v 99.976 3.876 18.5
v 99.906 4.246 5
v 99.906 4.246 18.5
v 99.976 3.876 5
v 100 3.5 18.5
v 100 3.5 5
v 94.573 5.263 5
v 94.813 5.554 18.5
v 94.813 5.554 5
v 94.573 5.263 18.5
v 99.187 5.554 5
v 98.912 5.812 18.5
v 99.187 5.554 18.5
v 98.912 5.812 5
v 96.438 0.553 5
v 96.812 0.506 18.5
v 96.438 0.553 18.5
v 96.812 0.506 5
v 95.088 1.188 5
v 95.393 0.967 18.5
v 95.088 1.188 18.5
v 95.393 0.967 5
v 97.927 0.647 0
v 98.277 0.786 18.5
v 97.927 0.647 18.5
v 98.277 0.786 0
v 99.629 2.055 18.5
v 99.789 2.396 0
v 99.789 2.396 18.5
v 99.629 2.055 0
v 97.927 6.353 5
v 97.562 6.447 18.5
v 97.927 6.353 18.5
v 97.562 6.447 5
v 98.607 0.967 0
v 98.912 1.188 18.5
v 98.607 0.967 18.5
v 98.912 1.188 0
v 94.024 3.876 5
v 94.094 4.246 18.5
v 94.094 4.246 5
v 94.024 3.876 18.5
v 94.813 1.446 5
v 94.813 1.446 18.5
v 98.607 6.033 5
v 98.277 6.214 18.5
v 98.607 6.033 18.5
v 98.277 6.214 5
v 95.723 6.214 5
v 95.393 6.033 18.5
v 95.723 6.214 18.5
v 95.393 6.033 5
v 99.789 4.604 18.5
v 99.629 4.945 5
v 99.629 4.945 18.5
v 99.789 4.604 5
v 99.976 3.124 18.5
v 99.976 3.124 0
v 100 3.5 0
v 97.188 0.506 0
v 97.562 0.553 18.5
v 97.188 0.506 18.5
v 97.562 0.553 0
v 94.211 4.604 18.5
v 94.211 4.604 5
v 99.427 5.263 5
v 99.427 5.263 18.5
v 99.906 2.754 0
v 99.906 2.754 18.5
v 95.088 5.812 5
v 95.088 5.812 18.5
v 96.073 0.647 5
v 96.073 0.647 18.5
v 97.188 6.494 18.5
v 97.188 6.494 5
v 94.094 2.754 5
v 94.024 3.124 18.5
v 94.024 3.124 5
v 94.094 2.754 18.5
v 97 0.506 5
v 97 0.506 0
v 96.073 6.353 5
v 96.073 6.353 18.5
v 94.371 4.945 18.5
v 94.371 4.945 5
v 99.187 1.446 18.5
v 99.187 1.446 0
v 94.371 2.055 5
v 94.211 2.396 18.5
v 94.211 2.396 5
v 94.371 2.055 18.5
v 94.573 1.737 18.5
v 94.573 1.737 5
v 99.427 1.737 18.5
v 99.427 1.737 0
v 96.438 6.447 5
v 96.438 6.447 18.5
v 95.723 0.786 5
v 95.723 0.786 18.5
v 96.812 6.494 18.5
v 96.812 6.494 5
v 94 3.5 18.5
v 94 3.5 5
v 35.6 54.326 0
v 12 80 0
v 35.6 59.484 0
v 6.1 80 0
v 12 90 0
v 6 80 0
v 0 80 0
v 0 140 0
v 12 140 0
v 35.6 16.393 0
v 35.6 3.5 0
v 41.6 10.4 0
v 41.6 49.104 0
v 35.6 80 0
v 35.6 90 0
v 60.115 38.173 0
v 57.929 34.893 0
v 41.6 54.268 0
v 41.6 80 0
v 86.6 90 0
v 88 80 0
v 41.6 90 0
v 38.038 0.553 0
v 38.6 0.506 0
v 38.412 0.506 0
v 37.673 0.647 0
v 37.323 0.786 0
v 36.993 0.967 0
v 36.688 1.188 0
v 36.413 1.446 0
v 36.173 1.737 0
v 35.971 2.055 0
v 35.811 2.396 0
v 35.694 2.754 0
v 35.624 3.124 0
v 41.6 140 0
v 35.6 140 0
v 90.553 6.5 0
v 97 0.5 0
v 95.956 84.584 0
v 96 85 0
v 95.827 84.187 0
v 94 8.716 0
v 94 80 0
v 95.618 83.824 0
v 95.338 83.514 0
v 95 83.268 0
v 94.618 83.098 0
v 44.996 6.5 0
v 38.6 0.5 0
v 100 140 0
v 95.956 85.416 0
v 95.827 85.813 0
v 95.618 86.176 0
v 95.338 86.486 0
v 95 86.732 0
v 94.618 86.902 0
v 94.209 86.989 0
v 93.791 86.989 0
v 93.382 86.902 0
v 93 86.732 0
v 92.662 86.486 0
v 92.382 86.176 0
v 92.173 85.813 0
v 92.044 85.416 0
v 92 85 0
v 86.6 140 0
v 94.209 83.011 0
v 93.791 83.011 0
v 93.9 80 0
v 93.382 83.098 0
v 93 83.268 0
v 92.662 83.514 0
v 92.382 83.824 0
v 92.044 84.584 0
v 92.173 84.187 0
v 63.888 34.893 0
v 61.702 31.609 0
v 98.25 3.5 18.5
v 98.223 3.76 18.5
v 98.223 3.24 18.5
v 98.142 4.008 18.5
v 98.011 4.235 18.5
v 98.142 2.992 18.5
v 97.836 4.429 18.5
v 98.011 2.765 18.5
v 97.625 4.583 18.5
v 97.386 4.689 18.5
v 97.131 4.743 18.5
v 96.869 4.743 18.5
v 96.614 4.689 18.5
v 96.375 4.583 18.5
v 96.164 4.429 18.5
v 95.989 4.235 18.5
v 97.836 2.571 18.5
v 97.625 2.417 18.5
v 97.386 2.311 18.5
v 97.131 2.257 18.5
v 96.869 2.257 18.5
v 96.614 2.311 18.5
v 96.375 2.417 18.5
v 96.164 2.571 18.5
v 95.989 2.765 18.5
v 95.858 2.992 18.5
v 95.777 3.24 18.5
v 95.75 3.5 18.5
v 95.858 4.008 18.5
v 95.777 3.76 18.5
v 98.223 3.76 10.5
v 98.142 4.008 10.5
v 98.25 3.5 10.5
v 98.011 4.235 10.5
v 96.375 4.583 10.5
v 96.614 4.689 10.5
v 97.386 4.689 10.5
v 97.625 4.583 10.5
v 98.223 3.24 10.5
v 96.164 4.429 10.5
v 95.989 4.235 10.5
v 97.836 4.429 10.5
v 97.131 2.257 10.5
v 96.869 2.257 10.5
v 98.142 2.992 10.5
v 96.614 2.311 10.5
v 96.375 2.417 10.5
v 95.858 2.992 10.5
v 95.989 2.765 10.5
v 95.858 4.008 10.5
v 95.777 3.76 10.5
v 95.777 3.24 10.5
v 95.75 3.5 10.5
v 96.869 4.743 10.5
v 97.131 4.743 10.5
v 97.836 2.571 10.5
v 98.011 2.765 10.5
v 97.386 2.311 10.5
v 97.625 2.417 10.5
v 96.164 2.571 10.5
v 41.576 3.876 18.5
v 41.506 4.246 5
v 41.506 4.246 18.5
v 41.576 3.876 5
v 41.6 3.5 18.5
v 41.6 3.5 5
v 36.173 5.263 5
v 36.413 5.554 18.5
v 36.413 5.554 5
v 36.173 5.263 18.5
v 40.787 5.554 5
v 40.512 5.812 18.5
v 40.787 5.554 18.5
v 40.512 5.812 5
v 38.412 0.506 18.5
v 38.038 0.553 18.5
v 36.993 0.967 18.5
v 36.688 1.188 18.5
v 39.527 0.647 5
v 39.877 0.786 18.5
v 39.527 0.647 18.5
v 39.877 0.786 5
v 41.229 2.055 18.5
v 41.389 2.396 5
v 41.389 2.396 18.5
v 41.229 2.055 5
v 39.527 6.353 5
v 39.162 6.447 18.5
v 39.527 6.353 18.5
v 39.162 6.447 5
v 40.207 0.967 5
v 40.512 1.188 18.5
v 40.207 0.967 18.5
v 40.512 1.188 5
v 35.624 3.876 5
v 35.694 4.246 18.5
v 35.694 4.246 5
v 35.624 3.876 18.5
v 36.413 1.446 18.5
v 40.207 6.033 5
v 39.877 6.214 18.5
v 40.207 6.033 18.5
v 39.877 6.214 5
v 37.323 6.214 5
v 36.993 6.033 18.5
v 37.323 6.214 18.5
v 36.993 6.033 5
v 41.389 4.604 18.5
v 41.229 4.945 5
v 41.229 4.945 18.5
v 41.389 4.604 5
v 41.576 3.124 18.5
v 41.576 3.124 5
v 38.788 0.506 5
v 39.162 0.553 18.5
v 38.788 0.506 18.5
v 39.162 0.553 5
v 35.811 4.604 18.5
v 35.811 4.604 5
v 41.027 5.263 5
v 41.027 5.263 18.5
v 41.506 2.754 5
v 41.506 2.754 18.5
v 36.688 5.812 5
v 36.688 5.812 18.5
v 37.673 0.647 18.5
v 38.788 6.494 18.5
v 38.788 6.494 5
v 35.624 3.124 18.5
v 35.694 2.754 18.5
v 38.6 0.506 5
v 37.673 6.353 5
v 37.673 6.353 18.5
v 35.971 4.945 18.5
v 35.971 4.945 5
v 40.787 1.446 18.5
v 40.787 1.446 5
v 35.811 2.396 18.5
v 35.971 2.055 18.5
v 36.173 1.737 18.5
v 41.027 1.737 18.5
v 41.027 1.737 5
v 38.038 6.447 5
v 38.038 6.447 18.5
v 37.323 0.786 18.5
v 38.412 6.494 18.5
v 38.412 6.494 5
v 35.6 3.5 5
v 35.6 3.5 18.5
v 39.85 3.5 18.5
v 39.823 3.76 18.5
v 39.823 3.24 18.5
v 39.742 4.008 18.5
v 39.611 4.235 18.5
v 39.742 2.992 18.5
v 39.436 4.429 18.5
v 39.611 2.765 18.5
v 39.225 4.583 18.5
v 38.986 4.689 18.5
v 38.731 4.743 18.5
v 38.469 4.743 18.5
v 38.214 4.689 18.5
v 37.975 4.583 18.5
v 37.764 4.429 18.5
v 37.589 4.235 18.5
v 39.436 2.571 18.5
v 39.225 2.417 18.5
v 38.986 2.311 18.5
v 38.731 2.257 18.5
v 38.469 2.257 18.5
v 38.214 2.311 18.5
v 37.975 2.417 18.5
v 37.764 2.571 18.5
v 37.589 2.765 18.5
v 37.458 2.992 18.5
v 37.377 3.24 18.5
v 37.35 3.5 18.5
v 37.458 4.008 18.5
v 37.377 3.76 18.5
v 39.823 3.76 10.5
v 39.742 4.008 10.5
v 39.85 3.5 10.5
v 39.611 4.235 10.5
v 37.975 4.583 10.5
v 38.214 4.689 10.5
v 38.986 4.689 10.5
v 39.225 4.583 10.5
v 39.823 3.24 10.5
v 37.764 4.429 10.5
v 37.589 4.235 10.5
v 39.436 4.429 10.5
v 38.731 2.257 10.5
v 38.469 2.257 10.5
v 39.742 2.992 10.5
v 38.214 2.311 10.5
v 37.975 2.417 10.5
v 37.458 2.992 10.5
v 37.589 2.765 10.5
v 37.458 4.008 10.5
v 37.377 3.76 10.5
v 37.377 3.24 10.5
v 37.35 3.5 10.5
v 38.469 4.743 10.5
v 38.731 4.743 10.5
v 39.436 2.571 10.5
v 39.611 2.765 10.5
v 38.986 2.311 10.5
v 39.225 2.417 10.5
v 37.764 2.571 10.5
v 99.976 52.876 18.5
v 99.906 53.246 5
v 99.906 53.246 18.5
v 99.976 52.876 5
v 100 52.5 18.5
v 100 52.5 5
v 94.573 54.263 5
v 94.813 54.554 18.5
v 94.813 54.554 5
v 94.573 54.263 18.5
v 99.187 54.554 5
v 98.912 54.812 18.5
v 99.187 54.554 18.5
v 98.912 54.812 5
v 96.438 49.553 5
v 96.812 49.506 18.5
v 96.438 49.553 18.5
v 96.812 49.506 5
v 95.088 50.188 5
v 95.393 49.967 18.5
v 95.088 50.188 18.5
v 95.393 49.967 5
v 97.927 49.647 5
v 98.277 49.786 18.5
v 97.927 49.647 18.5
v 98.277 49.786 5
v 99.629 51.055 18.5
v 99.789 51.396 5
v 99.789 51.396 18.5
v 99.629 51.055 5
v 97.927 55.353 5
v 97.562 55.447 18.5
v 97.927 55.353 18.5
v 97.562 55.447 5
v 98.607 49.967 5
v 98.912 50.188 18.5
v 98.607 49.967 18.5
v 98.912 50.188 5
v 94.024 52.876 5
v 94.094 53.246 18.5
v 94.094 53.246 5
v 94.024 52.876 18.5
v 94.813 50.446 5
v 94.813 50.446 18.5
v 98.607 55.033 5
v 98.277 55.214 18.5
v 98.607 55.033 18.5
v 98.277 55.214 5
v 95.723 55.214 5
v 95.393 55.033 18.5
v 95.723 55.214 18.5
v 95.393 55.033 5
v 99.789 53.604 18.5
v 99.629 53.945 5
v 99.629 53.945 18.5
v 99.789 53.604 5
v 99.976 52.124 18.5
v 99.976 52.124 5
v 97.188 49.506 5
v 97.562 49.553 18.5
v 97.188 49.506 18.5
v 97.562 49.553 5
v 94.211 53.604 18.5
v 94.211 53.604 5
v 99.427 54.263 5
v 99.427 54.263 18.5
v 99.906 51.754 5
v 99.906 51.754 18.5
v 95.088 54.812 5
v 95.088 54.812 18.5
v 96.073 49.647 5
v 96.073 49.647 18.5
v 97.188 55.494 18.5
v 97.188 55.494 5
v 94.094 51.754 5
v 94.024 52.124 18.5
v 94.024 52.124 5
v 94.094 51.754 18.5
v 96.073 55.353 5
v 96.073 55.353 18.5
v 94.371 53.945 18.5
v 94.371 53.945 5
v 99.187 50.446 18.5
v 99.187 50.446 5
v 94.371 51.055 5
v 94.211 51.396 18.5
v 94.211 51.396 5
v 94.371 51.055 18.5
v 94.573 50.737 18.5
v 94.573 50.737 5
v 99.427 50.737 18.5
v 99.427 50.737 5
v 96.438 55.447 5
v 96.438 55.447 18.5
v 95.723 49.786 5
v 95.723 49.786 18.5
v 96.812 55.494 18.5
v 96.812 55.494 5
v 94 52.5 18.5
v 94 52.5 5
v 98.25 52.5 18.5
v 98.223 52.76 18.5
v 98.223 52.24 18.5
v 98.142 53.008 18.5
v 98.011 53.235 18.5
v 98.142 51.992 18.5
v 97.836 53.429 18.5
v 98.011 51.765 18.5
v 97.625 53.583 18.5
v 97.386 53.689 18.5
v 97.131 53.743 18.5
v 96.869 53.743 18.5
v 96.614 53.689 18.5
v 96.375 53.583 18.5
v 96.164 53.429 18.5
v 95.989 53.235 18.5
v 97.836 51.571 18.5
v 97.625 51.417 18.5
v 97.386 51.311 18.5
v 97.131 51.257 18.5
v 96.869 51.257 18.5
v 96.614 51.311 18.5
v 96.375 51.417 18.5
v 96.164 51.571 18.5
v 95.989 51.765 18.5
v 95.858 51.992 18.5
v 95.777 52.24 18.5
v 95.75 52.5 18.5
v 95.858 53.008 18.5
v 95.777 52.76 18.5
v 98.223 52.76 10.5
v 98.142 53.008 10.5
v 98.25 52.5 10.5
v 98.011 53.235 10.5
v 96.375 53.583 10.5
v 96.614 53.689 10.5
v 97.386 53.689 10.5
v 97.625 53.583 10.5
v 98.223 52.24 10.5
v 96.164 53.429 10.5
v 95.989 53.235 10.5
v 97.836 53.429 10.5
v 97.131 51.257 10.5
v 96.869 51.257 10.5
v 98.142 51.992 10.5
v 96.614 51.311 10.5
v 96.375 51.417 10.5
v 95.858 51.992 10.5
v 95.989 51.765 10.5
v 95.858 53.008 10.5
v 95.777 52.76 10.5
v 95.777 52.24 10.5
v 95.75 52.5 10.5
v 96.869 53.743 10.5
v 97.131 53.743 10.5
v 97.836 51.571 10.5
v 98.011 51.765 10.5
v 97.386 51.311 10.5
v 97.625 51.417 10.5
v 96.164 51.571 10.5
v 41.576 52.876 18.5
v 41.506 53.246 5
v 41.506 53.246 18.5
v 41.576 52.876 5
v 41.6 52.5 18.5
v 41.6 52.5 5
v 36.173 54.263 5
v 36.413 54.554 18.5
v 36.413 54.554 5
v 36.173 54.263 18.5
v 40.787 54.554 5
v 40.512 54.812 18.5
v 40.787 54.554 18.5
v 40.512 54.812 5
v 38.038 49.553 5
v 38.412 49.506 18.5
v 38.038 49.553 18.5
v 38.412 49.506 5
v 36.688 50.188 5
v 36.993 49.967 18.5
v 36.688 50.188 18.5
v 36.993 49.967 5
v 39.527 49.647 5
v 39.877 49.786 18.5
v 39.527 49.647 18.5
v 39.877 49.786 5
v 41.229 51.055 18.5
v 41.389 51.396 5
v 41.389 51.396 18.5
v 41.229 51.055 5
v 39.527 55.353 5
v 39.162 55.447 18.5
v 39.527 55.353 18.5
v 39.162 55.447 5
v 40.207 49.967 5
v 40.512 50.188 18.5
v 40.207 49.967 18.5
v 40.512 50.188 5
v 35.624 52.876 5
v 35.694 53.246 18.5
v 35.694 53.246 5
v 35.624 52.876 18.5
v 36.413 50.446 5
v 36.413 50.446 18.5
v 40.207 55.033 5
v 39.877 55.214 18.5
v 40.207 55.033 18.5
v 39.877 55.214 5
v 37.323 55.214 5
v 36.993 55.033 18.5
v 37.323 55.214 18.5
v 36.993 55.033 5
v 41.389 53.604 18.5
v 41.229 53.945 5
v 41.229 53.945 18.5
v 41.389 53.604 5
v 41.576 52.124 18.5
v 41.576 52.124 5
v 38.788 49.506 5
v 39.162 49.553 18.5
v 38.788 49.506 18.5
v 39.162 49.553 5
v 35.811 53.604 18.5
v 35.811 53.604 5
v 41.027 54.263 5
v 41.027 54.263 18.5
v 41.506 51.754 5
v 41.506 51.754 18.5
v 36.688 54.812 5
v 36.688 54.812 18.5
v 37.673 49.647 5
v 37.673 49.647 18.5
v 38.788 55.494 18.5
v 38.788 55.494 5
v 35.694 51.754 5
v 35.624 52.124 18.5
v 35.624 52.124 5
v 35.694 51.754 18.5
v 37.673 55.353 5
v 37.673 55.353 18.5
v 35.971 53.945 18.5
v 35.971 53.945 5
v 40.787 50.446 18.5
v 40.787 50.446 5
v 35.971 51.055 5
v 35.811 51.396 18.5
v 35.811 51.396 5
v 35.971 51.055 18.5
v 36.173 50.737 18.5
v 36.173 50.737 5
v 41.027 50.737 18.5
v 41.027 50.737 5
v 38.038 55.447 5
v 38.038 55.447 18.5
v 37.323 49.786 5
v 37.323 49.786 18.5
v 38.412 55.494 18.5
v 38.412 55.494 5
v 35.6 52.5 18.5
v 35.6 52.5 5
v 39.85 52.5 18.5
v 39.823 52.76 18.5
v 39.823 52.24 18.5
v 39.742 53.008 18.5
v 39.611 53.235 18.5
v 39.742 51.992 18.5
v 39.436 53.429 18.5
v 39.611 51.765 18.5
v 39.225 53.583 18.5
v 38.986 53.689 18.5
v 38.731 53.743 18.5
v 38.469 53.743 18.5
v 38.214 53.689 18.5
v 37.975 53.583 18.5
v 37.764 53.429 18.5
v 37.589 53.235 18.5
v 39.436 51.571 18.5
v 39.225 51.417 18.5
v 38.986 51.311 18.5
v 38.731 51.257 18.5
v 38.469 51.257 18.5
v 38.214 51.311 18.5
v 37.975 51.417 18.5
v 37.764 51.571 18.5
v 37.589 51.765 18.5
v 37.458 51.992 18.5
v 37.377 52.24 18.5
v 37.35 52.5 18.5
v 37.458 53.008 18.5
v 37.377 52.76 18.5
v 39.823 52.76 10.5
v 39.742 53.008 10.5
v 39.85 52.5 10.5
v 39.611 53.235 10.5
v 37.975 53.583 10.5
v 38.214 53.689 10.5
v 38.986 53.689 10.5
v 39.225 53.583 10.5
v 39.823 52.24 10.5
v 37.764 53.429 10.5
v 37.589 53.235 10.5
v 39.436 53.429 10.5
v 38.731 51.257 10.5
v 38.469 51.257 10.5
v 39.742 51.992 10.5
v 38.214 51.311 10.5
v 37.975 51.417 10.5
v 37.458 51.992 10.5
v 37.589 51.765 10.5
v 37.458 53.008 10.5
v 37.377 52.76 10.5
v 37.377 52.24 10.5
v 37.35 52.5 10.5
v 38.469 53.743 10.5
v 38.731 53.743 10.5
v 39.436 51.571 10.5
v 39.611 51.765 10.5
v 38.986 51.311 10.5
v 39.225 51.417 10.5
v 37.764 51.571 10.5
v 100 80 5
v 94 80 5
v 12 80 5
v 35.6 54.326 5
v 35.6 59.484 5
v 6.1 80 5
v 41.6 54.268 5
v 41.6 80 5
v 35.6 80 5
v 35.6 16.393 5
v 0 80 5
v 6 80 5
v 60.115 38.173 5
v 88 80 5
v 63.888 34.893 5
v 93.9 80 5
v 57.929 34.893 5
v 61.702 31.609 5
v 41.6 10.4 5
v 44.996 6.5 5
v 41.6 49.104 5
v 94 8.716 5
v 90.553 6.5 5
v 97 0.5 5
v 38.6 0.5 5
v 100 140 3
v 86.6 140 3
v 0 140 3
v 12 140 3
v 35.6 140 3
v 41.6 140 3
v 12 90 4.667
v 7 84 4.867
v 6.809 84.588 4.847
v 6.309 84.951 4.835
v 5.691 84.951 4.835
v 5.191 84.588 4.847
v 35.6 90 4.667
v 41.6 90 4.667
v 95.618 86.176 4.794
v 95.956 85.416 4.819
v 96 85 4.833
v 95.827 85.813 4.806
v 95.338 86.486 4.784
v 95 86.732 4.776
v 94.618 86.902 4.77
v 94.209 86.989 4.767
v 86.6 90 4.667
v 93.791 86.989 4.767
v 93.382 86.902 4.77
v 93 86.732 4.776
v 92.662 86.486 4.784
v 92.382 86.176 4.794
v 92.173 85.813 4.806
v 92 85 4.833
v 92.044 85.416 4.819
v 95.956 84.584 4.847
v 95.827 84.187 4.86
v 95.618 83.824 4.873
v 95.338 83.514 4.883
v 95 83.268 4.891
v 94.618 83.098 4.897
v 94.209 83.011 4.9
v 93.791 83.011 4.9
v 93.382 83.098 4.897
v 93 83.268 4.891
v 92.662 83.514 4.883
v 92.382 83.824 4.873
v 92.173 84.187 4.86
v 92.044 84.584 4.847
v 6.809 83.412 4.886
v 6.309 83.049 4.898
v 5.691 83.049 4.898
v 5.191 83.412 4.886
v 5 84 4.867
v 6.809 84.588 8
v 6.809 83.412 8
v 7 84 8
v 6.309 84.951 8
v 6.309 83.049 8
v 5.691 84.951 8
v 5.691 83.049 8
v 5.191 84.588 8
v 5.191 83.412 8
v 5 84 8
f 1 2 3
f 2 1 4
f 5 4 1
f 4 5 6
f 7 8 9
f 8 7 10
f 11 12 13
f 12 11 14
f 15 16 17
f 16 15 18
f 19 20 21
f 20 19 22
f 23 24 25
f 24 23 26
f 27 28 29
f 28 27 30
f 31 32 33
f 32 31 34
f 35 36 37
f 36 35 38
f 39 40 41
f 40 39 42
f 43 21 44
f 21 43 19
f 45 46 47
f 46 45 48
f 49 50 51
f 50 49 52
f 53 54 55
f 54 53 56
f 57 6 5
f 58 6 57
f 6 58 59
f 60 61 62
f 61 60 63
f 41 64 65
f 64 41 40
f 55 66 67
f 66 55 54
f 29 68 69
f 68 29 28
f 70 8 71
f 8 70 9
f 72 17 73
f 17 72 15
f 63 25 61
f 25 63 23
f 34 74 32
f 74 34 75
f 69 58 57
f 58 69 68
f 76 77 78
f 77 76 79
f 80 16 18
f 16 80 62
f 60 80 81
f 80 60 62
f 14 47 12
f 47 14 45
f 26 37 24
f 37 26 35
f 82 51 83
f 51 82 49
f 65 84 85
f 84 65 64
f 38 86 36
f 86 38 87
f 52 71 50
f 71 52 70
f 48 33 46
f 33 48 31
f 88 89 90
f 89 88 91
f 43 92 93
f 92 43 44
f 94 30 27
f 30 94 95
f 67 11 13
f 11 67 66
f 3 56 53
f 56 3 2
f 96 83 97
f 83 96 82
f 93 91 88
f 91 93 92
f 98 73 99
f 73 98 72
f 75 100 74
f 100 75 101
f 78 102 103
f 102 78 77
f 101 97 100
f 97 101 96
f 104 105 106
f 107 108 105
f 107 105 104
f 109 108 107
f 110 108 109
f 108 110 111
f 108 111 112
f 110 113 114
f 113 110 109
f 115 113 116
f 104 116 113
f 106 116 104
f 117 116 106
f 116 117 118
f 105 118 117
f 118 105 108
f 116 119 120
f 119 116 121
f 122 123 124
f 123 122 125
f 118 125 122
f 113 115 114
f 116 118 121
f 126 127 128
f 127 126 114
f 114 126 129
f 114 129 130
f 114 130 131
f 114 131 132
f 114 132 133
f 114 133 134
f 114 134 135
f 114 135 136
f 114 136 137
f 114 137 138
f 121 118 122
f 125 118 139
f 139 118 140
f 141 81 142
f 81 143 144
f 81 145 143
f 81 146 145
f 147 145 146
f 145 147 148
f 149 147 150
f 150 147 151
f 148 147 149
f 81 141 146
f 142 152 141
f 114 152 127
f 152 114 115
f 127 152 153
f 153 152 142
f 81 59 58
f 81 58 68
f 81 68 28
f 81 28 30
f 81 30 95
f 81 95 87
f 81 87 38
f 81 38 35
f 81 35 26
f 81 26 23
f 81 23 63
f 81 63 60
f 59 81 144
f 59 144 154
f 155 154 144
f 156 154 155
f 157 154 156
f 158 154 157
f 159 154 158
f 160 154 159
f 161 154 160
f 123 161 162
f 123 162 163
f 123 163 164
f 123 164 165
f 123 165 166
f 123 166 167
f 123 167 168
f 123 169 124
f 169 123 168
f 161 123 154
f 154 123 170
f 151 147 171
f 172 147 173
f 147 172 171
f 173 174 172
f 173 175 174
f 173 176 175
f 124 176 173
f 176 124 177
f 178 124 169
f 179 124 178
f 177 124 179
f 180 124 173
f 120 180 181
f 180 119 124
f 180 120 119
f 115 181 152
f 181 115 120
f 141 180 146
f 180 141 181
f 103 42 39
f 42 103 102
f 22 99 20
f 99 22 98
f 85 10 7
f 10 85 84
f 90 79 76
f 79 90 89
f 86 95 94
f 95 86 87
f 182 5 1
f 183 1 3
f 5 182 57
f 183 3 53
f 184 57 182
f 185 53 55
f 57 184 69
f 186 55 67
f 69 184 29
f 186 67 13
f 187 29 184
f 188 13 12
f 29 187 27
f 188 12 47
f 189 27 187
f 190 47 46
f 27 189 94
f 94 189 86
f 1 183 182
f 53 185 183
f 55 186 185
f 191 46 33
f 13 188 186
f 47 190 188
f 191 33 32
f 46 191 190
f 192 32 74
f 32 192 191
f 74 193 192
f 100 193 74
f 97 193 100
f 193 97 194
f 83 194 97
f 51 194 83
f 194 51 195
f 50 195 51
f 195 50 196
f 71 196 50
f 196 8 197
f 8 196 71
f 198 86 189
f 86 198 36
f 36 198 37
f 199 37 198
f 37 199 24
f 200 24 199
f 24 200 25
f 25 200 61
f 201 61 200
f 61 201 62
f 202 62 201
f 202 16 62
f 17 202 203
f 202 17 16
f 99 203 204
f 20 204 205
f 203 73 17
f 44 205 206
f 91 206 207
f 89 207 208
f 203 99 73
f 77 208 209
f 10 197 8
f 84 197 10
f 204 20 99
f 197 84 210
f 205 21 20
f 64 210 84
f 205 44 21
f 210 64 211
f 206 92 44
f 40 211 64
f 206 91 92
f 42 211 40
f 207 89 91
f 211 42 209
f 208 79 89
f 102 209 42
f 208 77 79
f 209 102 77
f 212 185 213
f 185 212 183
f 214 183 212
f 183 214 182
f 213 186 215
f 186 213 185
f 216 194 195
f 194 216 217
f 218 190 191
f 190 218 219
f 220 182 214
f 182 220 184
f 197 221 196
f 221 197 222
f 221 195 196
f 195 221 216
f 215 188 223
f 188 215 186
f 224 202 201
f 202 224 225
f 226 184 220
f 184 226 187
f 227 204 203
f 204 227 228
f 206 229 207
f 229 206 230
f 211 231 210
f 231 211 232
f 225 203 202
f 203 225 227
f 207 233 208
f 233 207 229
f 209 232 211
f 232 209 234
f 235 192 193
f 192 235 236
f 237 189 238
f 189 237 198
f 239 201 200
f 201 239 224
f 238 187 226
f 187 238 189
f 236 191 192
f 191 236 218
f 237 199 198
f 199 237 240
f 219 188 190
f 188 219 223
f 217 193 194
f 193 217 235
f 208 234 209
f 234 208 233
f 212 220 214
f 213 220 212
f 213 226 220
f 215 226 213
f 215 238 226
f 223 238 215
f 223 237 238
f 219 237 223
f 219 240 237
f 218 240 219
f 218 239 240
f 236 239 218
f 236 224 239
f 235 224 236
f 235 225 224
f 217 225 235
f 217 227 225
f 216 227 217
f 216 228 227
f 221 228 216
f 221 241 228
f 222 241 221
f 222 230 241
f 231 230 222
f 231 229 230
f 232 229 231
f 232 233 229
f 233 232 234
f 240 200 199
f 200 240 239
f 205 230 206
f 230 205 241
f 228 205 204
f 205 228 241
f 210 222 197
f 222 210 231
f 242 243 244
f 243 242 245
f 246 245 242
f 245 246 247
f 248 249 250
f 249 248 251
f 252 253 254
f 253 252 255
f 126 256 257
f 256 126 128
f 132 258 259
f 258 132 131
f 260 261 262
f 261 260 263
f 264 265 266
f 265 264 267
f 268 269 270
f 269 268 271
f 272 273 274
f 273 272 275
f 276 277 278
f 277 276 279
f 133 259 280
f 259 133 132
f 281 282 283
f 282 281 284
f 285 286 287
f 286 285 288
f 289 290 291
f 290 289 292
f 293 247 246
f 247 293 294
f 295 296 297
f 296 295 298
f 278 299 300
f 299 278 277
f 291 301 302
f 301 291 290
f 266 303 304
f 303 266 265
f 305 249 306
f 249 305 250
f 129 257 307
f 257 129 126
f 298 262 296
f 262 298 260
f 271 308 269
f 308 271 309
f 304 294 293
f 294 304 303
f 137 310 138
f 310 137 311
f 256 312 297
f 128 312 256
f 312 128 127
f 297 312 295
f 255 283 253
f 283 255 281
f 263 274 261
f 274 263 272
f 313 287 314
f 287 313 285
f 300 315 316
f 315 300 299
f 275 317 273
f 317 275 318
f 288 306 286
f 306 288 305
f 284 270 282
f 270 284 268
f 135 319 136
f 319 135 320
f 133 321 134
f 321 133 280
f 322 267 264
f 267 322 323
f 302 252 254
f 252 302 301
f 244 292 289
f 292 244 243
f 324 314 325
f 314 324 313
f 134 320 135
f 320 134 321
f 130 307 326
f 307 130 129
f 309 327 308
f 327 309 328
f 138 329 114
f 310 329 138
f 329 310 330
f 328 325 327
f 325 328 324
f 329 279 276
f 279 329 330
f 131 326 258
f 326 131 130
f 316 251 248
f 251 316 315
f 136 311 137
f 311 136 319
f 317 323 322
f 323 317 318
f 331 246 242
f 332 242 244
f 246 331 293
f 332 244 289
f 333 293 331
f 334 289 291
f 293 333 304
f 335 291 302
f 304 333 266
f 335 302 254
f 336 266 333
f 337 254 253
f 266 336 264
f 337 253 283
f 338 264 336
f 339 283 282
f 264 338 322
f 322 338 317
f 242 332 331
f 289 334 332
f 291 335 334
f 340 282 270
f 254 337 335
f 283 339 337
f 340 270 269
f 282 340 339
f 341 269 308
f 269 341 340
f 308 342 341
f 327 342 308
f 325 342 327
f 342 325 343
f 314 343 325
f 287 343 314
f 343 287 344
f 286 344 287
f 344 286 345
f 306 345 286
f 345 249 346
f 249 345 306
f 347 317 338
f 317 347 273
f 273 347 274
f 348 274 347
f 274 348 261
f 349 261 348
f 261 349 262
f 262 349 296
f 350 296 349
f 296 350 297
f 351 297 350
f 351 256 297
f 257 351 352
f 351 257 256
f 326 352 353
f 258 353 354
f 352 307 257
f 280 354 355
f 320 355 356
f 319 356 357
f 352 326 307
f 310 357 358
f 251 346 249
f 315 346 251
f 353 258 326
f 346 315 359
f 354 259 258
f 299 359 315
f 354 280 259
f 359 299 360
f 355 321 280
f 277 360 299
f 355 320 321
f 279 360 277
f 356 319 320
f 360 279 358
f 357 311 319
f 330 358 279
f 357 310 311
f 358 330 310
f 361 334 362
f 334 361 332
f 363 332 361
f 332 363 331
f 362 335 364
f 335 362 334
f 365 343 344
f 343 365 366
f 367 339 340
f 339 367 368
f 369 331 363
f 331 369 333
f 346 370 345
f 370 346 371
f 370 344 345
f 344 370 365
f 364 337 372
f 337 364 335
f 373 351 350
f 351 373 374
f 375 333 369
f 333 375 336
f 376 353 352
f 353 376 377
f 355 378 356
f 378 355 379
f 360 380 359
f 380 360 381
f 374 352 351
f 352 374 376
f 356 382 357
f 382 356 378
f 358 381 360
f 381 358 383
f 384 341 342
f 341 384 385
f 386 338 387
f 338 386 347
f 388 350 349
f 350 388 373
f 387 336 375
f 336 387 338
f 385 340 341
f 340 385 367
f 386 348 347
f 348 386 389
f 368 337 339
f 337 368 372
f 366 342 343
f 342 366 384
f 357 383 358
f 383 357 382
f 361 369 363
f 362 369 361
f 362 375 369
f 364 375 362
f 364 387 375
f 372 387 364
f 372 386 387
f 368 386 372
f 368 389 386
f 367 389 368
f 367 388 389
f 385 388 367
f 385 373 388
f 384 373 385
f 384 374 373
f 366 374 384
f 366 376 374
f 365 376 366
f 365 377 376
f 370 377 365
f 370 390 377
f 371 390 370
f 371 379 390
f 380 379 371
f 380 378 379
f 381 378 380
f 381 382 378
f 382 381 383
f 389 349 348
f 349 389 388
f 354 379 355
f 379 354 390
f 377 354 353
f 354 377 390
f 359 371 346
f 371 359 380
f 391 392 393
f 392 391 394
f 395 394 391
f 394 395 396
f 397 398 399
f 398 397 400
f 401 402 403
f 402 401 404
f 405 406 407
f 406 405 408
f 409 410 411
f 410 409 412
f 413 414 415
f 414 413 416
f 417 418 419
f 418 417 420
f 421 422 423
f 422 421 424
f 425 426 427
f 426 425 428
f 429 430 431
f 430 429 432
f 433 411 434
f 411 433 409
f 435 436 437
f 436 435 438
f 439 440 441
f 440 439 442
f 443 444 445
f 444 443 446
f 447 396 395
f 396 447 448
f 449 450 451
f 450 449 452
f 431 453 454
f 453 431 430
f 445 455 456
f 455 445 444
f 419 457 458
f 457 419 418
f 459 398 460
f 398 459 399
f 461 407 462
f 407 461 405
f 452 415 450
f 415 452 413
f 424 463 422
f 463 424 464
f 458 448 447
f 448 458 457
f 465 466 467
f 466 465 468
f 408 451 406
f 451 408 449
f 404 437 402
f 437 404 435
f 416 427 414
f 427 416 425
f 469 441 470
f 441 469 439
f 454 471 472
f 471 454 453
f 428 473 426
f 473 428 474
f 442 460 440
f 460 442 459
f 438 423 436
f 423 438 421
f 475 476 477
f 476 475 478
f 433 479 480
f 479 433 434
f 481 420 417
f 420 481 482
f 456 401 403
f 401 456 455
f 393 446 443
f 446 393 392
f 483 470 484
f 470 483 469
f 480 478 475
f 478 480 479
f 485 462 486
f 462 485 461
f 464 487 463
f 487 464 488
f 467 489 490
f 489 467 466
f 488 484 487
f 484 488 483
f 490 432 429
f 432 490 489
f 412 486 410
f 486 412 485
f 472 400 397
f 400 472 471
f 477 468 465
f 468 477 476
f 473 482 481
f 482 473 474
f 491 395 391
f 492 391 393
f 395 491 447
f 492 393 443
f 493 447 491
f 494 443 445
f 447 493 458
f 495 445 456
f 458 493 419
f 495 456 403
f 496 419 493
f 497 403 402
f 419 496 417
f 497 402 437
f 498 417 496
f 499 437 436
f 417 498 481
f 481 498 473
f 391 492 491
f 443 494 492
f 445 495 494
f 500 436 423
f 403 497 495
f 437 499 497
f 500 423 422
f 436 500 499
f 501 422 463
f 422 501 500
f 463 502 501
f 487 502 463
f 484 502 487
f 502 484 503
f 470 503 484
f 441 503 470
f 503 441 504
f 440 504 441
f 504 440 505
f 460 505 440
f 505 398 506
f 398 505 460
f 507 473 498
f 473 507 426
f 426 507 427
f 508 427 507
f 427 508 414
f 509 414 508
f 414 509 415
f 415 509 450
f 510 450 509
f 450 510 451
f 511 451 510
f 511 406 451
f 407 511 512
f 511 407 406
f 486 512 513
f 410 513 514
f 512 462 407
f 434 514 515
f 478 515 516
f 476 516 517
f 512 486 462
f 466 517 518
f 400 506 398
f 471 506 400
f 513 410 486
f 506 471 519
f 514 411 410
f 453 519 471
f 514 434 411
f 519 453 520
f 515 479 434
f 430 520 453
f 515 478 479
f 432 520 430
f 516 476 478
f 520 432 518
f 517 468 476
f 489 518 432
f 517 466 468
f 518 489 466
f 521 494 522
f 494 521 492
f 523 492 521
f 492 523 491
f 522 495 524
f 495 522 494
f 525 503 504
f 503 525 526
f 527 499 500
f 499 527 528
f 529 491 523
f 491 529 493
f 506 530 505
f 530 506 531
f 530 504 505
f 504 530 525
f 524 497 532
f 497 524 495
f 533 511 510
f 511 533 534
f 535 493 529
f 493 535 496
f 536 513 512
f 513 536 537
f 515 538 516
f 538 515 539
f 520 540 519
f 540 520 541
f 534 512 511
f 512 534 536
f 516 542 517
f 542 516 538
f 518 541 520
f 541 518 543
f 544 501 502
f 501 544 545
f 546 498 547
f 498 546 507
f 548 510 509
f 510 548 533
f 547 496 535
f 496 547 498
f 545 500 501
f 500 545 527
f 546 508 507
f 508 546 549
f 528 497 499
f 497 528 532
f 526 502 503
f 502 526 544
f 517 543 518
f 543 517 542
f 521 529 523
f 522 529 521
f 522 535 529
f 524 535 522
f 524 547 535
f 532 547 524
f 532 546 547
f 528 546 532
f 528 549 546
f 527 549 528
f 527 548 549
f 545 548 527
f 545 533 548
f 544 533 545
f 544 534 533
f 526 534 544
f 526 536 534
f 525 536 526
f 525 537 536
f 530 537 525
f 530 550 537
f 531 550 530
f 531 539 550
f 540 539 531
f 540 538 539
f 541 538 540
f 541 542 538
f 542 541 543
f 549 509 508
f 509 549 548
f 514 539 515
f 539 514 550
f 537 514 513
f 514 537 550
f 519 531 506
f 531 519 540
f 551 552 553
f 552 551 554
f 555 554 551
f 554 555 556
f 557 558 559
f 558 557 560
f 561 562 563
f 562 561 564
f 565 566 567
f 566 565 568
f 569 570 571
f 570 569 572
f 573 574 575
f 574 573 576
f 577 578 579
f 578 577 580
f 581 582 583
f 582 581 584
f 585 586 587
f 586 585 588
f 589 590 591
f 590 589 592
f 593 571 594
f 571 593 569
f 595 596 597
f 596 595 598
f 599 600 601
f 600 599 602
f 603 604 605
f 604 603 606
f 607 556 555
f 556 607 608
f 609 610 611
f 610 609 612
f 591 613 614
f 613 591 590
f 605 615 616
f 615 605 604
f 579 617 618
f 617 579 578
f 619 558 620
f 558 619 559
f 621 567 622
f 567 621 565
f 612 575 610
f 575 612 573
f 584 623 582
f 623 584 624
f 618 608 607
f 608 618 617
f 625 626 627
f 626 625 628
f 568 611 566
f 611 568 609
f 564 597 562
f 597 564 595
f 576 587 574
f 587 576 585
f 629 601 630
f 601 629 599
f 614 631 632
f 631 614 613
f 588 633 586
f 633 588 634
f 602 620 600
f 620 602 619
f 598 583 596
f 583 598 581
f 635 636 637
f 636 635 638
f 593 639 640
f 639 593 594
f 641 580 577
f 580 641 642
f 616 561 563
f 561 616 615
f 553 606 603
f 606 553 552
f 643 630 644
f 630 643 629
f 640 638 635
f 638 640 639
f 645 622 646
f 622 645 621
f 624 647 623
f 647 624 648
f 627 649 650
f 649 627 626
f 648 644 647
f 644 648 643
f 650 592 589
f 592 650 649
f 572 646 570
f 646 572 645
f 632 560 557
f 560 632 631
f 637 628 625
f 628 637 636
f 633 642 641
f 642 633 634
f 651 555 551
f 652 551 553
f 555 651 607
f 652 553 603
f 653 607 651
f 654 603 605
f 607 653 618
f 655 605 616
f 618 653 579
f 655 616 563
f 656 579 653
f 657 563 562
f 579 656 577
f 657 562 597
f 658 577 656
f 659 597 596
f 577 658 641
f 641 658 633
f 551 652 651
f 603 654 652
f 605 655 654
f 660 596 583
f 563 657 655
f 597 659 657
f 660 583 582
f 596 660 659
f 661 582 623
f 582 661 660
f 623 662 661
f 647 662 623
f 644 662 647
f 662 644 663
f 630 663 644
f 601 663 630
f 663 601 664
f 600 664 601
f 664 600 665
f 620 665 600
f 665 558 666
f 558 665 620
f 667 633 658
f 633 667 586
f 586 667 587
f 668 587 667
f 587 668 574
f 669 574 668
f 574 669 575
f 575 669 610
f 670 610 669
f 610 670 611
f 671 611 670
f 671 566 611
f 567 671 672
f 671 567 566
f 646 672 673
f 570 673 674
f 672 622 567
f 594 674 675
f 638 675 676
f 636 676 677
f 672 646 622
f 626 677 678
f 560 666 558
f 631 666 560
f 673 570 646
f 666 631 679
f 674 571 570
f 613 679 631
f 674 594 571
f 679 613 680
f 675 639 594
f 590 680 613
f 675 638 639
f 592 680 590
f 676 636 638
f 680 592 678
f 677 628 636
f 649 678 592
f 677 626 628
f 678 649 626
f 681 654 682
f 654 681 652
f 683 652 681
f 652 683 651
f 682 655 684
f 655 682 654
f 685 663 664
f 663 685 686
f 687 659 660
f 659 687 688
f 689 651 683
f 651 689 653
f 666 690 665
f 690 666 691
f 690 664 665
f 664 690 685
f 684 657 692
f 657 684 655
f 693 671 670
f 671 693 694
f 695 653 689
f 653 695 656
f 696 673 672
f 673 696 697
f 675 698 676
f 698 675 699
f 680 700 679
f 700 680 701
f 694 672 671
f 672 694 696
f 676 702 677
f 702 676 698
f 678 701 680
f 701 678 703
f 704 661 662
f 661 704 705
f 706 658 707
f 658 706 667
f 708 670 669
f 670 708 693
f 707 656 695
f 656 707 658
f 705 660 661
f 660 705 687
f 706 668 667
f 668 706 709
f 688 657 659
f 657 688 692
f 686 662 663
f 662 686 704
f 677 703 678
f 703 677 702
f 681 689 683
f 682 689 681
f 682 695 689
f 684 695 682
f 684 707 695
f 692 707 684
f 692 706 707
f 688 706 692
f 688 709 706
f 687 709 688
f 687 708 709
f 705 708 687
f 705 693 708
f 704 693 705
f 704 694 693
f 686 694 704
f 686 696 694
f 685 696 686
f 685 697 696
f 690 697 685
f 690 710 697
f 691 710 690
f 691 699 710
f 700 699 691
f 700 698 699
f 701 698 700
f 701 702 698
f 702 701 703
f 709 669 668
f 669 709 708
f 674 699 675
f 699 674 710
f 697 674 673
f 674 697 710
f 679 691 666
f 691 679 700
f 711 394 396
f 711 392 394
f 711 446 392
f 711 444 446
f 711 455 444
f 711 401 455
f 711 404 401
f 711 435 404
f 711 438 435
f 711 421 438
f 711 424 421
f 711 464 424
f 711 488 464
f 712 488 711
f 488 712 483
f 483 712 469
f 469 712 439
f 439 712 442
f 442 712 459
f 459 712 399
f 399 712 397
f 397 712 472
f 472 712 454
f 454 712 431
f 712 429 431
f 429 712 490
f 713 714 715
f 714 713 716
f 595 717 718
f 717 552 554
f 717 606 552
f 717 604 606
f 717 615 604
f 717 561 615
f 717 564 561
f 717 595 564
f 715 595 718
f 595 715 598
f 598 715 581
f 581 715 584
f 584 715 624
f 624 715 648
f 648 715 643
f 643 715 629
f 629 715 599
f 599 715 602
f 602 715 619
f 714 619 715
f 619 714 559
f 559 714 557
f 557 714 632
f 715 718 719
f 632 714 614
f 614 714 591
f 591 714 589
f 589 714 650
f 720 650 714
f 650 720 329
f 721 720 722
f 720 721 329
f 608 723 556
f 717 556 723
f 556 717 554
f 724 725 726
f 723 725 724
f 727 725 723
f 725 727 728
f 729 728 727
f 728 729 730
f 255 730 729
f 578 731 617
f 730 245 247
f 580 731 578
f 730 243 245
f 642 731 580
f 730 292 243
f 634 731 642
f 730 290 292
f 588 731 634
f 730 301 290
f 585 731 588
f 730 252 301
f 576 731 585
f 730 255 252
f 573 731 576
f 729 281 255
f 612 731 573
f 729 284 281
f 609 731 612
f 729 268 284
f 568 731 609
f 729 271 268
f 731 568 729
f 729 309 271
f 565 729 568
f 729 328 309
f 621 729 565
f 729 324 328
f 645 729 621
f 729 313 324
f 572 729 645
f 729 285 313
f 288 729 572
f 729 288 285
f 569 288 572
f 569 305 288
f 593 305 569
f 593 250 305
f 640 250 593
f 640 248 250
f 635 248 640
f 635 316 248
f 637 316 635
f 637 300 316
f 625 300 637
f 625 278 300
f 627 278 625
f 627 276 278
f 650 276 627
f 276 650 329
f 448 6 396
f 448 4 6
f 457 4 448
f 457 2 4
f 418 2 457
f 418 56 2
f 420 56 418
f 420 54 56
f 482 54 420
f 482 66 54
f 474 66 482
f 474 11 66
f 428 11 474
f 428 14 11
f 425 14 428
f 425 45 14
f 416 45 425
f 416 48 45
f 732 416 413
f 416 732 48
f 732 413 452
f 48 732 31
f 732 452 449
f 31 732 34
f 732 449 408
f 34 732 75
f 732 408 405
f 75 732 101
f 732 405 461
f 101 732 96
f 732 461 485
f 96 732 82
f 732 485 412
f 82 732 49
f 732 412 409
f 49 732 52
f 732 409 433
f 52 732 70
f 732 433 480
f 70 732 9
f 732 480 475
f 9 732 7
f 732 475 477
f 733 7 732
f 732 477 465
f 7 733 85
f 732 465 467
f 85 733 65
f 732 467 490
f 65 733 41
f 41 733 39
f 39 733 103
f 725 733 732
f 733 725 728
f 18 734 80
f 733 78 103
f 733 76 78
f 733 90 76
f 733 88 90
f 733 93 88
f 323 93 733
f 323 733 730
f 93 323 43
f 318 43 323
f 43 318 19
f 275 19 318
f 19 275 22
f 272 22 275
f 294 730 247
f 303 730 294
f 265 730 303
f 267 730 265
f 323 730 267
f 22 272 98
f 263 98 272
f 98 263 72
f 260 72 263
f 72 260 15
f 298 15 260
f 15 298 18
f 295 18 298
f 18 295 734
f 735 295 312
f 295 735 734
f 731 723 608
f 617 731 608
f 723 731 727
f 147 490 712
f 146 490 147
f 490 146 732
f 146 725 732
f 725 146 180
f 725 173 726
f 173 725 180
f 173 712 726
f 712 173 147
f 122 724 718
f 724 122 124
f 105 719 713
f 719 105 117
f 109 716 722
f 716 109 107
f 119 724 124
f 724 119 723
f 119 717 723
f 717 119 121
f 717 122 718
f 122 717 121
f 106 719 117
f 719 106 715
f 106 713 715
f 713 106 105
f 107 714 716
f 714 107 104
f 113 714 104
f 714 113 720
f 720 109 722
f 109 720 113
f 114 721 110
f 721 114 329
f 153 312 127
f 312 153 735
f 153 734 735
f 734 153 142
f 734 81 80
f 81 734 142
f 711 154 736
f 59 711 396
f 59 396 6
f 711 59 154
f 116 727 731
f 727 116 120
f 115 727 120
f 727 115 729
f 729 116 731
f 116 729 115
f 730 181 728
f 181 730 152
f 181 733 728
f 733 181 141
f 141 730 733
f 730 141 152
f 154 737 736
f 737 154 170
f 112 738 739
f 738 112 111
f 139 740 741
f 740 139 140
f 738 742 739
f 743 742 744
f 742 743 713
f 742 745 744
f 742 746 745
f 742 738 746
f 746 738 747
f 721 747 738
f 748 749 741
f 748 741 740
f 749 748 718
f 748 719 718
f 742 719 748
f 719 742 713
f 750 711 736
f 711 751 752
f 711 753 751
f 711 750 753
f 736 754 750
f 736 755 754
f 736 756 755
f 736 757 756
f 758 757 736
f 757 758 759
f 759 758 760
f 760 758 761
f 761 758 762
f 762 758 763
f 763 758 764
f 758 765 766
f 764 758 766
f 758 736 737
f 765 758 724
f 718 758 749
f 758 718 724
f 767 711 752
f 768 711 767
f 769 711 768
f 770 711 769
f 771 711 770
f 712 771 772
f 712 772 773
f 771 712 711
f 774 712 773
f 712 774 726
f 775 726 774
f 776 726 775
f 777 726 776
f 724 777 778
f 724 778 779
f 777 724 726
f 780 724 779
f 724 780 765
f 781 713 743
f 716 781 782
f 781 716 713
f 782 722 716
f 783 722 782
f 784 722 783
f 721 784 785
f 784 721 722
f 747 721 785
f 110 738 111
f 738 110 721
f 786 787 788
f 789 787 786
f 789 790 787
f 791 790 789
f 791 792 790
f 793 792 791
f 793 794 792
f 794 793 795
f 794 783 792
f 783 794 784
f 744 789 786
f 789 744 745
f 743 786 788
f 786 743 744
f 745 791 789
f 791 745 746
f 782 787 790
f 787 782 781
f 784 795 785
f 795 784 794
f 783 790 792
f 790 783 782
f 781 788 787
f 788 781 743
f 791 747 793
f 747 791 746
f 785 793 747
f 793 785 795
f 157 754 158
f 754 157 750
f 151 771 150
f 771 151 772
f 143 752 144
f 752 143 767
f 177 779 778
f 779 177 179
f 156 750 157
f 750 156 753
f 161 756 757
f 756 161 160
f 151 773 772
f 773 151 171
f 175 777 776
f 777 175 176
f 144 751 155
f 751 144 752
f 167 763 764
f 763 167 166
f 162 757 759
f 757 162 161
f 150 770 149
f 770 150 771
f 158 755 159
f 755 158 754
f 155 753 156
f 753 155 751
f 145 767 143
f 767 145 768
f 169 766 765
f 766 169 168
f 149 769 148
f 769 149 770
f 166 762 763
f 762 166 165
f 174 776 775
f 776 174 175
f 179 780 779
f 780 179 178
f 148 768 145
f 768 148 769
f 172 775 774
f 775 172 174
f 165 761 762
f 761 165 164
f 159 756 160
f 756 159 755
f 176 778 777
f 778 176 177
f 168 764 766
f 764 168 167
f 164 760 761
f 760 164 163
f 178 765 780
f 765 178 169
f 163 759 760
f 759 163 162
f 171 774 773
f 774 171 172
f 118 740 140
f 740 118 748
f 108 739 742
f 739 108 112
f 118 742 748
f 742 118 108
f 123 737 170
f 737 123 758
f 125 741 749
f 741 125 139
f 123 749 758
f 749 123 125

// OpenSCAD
module Socket() {
  difference() {
    cylinder(h = 18.5, r = 3, $fn = 50);
    translate(v = [0,0,10.5]) {
        cylinder(h = 13, r = 1.25, $fn = 30);
    } 
  }
}
difference() {
    union() {
        //cube(size = [100, 80, 5]);
        linear_extrude(5) {
            union() {
                polygon([[0,80], [35.6, 3.5], [41.6, 3.5], [6, 80]]);
                polygon([[35.6,80], [35.6, 3.5], [41.6, 3.5], [41.6, 80]]);
                polygon([[94,80], [94, 3.5], [100, 3.5], [100, 80]]);
                polygon([[38.6, 0.5], [97, 0.5], [97, 6.5], [38.6, 6.5]]);
                polygon([[6.1, 80], [94, 3.5], [100, 3.5], [12, 80]]);
                polygon([[88, 80], [37, 3.5], [43, 3.5], [93.9, 80]]);
            }
        } 
        translate(v = [97, 3.5, 0]) { 
            Socket();
        }
        translate(v = [38.6, 3.5, 0]) { 
            Socket();
        }
        translate(v = [97, 52.5, 0]) { 
            Socket();
        }
        translate(v = [38.6, 52.5, 0]) { 
            Socket();
        }
            rotate([90,0,90]){
                linear_extrude(100) {
                    polygon([[80,0], [80,5], [140, 3], [140, 0]]);
                } 
        } 
        translate([6, 84, 4]){ 
            cylinder(h = 4, r = 1, $fn = 10);
        }
    }
    translate([94, 85, 0]) {
        cylinder(h = 5, r = 2, $fn = 30);
    } 
    translate([12, 90, 0]) {
        cube([23.6, 60, 5]);
    } 
    translate([41.6, 90, 0]) {
        cube([45, 60, 5]);
    } 
}
